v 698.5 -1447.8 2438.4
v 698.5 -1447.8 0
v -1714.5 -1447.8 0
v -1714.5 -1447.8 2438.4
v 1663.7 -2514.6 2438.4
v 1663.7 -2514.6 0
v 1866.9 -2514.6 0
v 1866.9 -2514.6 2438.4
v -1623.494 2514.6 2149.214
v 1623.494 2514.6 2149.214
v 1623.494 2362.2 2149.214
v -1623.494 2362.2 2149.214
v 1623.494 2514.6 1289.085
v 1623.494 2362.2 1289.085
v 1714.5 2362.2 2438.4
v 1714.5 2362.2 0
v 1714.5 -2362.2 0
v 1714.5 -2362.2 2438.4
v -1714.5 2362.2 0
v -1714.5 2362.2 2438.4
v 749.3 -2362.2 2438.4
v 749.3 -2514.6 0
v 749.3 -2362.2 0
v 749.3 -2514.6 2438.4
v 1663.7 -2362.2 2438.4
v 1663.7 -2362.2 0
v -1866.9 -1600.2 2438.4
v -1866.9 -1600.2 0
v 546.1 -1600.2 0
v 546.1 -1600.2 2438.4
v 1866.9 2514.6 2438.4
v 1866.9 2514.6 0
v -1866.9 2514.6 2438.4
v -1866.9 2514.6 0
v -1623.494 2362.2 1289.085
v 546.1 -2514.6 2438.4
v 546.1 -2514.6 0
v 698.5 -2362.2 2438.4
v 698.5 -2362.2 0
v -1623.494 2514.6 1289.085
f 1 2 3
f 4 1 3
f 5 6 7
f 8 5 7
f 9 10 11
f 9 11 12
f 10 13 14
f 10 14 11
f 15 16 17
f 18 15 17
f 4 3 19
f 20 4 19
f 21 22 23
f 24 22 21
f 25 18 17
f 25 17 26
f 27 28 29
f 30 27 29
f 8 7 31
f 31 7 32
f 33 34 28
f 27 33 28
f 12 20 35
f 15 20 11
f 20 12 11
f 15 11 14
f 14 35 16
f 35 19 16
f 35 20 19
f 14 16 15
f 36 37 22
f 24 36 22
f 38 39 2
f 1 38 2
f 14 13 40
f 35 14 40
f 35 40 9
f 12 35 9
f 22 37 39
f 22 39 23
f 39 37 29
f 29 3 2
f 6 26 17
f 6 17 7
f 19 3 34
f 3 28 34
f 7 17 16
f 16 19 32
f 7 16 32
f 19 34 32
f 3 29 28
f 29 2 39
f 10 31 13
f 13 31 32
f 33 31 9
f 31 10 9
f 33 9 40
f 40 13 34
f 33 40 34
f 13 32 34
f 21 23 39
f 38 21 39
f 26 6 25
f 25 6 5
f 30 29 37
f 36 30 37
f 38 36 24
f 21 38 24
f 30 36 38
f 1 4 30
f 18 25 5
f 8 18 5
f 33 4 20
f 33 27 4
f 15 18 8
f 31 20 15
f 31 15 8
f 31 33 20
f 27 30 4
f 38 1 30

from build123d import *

# Parameters (mm, degrees)
F1_DEPTH = 2438.4
F2_W     = 914.4
F2_H     = 4309.368201
F3_DEPTH = 406.4
F4_W     = 3246.987104
F4_H     = 860.12888
F5_DEPTH = 482.6


with BuildPart() as f1:
    # F0 (on Top) → F1 (new body)
    with BuildSketch(Plane.XY):
        Polygon((-1866.9, -1600.2), (546.1, -1600.2), (546.1, -2514.6), (1866.9, -2514.6), (1866.9, 2514.6), (-1866.9, 2514.6), align=None)
        Polygon((1714.5, 2362.2), (1714.5, -2362.2), (698.5, -2362.2), (698.5, -1447.8), (-1714.5, -1447.8), (-1714.5, 2362.2), align=None, mode=Mode.SUBTRACT)
    extrude(amount=F1_DEPTH)

    # F2 (on face) → F3 (cut)
    with BuildSketch(Plane.XZ.offset(2514.6)):
        with Locations((1206.5, 1377.028703)):
            Rectangle(F2_W, F2_H)
    extrude(amount=-F3_DEPTH, mode=Mode.SUBTRACT)

    # F4 (on face) → F5 (cut)
    with BuildSketch(Plane(origin=(0, 2514.6, 0), x_dir=(-1, 0, 0), z_dir=(0, 1, 0))):
        with Locations((0, 1719.149828)):
            Rectangle(F4_W, F4_H)
    extrude(amount=-F5_DEPTH, mode=Mode.SUBTRACT)


solid = f1.part
